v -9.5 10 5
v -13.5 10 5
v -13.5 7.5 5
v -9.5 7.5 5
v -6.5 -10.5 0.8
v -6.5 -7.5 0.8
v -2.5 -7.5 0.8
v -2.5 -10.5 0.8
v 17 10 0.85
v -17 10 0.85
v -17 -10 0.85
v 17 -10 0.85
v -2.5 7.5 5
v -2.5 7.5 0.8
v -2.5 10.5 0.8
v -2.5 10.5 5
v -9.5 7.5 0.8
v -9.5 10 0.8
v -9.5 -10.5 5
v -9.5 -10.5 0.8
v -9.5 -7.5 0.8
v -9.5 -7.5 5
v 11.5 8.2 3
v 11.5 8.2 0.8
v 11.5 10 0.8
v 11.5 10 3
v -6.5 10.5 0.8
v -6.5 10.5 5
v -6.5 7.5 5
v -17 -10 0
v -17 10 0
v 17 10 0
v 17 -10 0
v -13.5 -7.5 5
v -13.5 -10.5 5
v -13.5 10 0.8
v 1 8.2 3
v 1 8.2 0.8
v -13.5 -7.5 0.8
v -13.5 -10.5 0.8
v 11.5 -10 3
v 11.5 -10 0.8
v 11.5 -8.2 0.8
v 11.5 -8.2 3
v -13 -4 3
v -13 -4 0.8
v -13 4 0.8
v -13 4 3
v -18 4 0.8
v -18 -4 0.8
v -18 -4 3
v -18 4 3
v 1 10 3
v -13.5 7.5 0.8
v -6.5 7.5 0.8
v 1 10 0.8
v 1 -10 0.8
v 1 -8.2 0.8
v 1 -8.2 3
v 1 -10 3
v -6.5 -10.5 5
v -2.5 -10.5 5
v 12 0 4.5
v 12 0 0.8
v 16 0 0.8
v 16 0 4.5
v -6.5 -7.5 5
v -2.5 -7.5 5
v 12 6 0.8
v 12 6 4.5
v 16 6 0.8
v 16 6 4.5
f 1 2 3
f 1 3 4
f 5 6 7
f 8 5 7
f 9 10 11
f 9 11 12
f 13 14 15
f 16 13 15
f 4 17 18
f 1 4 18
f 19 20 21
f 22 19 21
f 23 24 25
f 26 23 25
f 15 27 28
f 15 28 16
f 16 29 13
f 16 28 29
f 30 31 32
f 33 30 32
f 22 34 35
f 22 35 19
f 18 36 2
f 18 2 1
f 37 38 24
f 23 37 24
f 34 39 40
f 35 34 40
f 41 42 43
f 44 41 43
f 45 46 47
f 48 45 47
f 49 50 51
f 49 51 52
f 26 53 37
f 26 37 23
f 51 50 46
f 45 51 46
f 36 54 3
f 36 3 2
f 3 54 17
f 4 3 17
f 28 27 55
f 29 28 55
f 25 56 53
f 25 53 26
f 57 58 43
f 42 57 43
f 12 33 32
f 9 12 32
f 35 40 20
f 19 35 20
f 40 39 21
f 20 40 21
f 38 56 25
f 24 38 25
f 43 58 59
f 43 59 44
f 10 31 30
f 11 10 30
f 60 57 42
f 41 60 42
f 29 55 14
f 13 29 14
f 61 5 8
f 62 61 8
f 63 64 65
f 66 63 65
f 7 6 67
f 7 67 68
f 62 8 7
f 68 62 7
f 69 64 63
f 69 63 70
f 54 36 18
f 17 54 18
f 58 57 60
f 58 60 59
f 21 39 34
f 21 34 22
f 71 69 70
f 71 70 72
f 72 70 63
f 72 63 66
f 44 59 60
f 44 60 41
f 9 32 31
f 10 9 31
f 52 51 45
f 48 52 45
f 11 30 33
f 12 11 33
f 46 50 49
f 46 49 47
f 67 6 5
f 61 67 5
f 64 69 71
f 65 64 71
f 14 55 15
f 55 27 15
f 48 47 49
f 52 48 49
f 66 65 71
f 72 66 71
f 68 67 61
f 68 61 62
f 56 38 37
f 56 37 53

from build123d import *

# Parameters (mm, degrees)
F0_W     = 4
F0_H     = 6
F0_W_2   = 10.5
F0_H_2   = 1.8
F0_H_3   = 8
F0_H_4   = 2.5
F1_DEPTH = 0.85
F2_START = 0.8
F2_DEPTH = 2.2
F3_START = 0.8
F3_DEPTH = 3.7
F4_START = 0.8
F0_W_3   = 1
F4_DEPTH = 2.2
F5_START = 0.8
F0_H_5   = 0.5
F5_DEPTH = 4.2


with BuildPart() as f1:
    # F0 (on Top) → F1 (new body)
    with BuildSketch(Plane.XY):
        Polygon((1, 8.2), (1, 10), (-2.5, 10), (-2.5, 7.5), (-6.5, 7.5), (-6.5, 10), (-9.5, 10), (-9.5, 7.5), (-13.5, 7.5), (-13.5, 10), (-17, 10), (-17, 4), (-13, 4), (-13, -4), (-17, -4), (-17, -10), (-13.5, -10), (-13.5, -7.5), (-9.5, -7.5), (-9.5, -10), (-6.5, -10), (-6.5, -7.5), (-2.5, -7.5), (-2.5, -10), (1, -10), (1, -8.2), (11.5, -8.2), (11.5, -10), (17, -10), (17, 10), (11.5, 10), (11.5, 8.2), align=None)
        with Locations((14, 3)):
            Rectangle(F0_W, F0_H, mode=Mode.SUBTRACT)
        with Locations((6.25, -9.1)):
            Rectangle(F0_W_2, F0_H_2)
        with Locations((6.25, 9.1)):
            Rectangle(F0_W_2, F0_H_2)
        with Locations((-15, 0)):
            Rectangle(F0_W, F0_H_3)
        with Locations((14, 3)):
            Rectangle(F0_W, F0_H)
        with Locations((-4.5, -8.75)):
            Rectangle(F0_W, F0_H_4)
        with Locations((-11.5, -8.75)):
            Rectangle(F0_W, F0_H_4)
        with Locations((-11.5, 8.75)):
            Rectangle(F0_W, F0_H_4)
        with Locations((-4.5, 8.75)):
            Rectangle(F0_W, F0_H_4)
    extrude(amount=F1_DEPTH)


with BuildPart() as f2:
    # F0 (on Top) → F2 (new body)
    with BuildSketch(Plane.XY.offset(F2_START)):
        with Locations((6.25, -9.1)):
            Rectangle(F0_W_2, F0_H_2)
    extrude(amount=F2_DEPTH)


with BuildPart() as f2b:
    # F0 (on Top) → F2, piece 2 (new body)
    with BuildSketch(Plane.XY.offset(F2_START)):
        with Locations((6.25, 9.1)):
            Rectangle(F0_W_2, F0_H_2)
    extrude(amount=F2_DEPTH)


with BuildPart() as f3:
    # F0 (on Top) → F3 (new body)
    with BuildSketch(Plane.XY.offset(F3_START)):
        with Locations((14, 3)):
            Rectangle(F0_W, F0_H)
    extrude(amount=F3_DEPTH)


with BuildPart() as f4:
    # F0 (on Top) → F4 (new body)
    with BuildSketch(Plane.XY.offset(F4_START)):
        with Locations((-15, 0)):
            Rectangle(F0_W, F0_H_3)
        with Locations((-17.5, 0)):
            Rectangle(F0_W_3, F0_H_3)
    extrude(amount=F4_DEPTH)


with BuildPart() as f5:
    # F0 (on Top) → F5 (new body)
    with BuildSketch(Plane.XY.offset(F5_START)):
        with Locations((-11.5, -8.75)):
            Rectangle(F0_W, F0_H_4)
        with Locations((-11.5, -10.25)):
            Rectangle(F0_W, F0_H_5)
    extrude(amount=F5_DEPTH)


with BuildPart() as f5b:
    # F0 (on Top) → F5, piece 2 (new body)
    with BuildSketch(Plane.XY.offset(F5_START)):
        with Locations((-4.5, -8.75)):
            Rectangle(F0_W, F0_H_4)
        with Locations((-4.5, -10.25)):
            Rectangle(F0_W, F0_H_5)
    extrude(amount=F5_DEPTH)


with BuildPart() as f5c:
    # F0 (on Top) → F5, piece 3 (new body)
    with BuildSketch(Plane.XY.offset(F5_START)):
        with Locations((-4.5, 8.75)):
            Rectangle(F0_W, F0_H_4)
        with Locations((-4.5, 10.25)):
            Rectangle(F0_W, F0_H_5)
    extrude(amount=F5_DEPTH)


with BuildPart() as f5d:
    # F0 (on Top) → F5, piece 4 (new body)
    with BuildSketch(Plane.XY.offset(F5_START)):
        with Locations((-11.5, 8.75)):
            Rectangle(F0_W, F0_H_4)
    extrude(amount=F5_DEPTH)


solid = Compound([f1.part, f2.part, f2b.part, f3.part, f4.part, f5.part, f5b.part, f5c.part, f5d.part])
